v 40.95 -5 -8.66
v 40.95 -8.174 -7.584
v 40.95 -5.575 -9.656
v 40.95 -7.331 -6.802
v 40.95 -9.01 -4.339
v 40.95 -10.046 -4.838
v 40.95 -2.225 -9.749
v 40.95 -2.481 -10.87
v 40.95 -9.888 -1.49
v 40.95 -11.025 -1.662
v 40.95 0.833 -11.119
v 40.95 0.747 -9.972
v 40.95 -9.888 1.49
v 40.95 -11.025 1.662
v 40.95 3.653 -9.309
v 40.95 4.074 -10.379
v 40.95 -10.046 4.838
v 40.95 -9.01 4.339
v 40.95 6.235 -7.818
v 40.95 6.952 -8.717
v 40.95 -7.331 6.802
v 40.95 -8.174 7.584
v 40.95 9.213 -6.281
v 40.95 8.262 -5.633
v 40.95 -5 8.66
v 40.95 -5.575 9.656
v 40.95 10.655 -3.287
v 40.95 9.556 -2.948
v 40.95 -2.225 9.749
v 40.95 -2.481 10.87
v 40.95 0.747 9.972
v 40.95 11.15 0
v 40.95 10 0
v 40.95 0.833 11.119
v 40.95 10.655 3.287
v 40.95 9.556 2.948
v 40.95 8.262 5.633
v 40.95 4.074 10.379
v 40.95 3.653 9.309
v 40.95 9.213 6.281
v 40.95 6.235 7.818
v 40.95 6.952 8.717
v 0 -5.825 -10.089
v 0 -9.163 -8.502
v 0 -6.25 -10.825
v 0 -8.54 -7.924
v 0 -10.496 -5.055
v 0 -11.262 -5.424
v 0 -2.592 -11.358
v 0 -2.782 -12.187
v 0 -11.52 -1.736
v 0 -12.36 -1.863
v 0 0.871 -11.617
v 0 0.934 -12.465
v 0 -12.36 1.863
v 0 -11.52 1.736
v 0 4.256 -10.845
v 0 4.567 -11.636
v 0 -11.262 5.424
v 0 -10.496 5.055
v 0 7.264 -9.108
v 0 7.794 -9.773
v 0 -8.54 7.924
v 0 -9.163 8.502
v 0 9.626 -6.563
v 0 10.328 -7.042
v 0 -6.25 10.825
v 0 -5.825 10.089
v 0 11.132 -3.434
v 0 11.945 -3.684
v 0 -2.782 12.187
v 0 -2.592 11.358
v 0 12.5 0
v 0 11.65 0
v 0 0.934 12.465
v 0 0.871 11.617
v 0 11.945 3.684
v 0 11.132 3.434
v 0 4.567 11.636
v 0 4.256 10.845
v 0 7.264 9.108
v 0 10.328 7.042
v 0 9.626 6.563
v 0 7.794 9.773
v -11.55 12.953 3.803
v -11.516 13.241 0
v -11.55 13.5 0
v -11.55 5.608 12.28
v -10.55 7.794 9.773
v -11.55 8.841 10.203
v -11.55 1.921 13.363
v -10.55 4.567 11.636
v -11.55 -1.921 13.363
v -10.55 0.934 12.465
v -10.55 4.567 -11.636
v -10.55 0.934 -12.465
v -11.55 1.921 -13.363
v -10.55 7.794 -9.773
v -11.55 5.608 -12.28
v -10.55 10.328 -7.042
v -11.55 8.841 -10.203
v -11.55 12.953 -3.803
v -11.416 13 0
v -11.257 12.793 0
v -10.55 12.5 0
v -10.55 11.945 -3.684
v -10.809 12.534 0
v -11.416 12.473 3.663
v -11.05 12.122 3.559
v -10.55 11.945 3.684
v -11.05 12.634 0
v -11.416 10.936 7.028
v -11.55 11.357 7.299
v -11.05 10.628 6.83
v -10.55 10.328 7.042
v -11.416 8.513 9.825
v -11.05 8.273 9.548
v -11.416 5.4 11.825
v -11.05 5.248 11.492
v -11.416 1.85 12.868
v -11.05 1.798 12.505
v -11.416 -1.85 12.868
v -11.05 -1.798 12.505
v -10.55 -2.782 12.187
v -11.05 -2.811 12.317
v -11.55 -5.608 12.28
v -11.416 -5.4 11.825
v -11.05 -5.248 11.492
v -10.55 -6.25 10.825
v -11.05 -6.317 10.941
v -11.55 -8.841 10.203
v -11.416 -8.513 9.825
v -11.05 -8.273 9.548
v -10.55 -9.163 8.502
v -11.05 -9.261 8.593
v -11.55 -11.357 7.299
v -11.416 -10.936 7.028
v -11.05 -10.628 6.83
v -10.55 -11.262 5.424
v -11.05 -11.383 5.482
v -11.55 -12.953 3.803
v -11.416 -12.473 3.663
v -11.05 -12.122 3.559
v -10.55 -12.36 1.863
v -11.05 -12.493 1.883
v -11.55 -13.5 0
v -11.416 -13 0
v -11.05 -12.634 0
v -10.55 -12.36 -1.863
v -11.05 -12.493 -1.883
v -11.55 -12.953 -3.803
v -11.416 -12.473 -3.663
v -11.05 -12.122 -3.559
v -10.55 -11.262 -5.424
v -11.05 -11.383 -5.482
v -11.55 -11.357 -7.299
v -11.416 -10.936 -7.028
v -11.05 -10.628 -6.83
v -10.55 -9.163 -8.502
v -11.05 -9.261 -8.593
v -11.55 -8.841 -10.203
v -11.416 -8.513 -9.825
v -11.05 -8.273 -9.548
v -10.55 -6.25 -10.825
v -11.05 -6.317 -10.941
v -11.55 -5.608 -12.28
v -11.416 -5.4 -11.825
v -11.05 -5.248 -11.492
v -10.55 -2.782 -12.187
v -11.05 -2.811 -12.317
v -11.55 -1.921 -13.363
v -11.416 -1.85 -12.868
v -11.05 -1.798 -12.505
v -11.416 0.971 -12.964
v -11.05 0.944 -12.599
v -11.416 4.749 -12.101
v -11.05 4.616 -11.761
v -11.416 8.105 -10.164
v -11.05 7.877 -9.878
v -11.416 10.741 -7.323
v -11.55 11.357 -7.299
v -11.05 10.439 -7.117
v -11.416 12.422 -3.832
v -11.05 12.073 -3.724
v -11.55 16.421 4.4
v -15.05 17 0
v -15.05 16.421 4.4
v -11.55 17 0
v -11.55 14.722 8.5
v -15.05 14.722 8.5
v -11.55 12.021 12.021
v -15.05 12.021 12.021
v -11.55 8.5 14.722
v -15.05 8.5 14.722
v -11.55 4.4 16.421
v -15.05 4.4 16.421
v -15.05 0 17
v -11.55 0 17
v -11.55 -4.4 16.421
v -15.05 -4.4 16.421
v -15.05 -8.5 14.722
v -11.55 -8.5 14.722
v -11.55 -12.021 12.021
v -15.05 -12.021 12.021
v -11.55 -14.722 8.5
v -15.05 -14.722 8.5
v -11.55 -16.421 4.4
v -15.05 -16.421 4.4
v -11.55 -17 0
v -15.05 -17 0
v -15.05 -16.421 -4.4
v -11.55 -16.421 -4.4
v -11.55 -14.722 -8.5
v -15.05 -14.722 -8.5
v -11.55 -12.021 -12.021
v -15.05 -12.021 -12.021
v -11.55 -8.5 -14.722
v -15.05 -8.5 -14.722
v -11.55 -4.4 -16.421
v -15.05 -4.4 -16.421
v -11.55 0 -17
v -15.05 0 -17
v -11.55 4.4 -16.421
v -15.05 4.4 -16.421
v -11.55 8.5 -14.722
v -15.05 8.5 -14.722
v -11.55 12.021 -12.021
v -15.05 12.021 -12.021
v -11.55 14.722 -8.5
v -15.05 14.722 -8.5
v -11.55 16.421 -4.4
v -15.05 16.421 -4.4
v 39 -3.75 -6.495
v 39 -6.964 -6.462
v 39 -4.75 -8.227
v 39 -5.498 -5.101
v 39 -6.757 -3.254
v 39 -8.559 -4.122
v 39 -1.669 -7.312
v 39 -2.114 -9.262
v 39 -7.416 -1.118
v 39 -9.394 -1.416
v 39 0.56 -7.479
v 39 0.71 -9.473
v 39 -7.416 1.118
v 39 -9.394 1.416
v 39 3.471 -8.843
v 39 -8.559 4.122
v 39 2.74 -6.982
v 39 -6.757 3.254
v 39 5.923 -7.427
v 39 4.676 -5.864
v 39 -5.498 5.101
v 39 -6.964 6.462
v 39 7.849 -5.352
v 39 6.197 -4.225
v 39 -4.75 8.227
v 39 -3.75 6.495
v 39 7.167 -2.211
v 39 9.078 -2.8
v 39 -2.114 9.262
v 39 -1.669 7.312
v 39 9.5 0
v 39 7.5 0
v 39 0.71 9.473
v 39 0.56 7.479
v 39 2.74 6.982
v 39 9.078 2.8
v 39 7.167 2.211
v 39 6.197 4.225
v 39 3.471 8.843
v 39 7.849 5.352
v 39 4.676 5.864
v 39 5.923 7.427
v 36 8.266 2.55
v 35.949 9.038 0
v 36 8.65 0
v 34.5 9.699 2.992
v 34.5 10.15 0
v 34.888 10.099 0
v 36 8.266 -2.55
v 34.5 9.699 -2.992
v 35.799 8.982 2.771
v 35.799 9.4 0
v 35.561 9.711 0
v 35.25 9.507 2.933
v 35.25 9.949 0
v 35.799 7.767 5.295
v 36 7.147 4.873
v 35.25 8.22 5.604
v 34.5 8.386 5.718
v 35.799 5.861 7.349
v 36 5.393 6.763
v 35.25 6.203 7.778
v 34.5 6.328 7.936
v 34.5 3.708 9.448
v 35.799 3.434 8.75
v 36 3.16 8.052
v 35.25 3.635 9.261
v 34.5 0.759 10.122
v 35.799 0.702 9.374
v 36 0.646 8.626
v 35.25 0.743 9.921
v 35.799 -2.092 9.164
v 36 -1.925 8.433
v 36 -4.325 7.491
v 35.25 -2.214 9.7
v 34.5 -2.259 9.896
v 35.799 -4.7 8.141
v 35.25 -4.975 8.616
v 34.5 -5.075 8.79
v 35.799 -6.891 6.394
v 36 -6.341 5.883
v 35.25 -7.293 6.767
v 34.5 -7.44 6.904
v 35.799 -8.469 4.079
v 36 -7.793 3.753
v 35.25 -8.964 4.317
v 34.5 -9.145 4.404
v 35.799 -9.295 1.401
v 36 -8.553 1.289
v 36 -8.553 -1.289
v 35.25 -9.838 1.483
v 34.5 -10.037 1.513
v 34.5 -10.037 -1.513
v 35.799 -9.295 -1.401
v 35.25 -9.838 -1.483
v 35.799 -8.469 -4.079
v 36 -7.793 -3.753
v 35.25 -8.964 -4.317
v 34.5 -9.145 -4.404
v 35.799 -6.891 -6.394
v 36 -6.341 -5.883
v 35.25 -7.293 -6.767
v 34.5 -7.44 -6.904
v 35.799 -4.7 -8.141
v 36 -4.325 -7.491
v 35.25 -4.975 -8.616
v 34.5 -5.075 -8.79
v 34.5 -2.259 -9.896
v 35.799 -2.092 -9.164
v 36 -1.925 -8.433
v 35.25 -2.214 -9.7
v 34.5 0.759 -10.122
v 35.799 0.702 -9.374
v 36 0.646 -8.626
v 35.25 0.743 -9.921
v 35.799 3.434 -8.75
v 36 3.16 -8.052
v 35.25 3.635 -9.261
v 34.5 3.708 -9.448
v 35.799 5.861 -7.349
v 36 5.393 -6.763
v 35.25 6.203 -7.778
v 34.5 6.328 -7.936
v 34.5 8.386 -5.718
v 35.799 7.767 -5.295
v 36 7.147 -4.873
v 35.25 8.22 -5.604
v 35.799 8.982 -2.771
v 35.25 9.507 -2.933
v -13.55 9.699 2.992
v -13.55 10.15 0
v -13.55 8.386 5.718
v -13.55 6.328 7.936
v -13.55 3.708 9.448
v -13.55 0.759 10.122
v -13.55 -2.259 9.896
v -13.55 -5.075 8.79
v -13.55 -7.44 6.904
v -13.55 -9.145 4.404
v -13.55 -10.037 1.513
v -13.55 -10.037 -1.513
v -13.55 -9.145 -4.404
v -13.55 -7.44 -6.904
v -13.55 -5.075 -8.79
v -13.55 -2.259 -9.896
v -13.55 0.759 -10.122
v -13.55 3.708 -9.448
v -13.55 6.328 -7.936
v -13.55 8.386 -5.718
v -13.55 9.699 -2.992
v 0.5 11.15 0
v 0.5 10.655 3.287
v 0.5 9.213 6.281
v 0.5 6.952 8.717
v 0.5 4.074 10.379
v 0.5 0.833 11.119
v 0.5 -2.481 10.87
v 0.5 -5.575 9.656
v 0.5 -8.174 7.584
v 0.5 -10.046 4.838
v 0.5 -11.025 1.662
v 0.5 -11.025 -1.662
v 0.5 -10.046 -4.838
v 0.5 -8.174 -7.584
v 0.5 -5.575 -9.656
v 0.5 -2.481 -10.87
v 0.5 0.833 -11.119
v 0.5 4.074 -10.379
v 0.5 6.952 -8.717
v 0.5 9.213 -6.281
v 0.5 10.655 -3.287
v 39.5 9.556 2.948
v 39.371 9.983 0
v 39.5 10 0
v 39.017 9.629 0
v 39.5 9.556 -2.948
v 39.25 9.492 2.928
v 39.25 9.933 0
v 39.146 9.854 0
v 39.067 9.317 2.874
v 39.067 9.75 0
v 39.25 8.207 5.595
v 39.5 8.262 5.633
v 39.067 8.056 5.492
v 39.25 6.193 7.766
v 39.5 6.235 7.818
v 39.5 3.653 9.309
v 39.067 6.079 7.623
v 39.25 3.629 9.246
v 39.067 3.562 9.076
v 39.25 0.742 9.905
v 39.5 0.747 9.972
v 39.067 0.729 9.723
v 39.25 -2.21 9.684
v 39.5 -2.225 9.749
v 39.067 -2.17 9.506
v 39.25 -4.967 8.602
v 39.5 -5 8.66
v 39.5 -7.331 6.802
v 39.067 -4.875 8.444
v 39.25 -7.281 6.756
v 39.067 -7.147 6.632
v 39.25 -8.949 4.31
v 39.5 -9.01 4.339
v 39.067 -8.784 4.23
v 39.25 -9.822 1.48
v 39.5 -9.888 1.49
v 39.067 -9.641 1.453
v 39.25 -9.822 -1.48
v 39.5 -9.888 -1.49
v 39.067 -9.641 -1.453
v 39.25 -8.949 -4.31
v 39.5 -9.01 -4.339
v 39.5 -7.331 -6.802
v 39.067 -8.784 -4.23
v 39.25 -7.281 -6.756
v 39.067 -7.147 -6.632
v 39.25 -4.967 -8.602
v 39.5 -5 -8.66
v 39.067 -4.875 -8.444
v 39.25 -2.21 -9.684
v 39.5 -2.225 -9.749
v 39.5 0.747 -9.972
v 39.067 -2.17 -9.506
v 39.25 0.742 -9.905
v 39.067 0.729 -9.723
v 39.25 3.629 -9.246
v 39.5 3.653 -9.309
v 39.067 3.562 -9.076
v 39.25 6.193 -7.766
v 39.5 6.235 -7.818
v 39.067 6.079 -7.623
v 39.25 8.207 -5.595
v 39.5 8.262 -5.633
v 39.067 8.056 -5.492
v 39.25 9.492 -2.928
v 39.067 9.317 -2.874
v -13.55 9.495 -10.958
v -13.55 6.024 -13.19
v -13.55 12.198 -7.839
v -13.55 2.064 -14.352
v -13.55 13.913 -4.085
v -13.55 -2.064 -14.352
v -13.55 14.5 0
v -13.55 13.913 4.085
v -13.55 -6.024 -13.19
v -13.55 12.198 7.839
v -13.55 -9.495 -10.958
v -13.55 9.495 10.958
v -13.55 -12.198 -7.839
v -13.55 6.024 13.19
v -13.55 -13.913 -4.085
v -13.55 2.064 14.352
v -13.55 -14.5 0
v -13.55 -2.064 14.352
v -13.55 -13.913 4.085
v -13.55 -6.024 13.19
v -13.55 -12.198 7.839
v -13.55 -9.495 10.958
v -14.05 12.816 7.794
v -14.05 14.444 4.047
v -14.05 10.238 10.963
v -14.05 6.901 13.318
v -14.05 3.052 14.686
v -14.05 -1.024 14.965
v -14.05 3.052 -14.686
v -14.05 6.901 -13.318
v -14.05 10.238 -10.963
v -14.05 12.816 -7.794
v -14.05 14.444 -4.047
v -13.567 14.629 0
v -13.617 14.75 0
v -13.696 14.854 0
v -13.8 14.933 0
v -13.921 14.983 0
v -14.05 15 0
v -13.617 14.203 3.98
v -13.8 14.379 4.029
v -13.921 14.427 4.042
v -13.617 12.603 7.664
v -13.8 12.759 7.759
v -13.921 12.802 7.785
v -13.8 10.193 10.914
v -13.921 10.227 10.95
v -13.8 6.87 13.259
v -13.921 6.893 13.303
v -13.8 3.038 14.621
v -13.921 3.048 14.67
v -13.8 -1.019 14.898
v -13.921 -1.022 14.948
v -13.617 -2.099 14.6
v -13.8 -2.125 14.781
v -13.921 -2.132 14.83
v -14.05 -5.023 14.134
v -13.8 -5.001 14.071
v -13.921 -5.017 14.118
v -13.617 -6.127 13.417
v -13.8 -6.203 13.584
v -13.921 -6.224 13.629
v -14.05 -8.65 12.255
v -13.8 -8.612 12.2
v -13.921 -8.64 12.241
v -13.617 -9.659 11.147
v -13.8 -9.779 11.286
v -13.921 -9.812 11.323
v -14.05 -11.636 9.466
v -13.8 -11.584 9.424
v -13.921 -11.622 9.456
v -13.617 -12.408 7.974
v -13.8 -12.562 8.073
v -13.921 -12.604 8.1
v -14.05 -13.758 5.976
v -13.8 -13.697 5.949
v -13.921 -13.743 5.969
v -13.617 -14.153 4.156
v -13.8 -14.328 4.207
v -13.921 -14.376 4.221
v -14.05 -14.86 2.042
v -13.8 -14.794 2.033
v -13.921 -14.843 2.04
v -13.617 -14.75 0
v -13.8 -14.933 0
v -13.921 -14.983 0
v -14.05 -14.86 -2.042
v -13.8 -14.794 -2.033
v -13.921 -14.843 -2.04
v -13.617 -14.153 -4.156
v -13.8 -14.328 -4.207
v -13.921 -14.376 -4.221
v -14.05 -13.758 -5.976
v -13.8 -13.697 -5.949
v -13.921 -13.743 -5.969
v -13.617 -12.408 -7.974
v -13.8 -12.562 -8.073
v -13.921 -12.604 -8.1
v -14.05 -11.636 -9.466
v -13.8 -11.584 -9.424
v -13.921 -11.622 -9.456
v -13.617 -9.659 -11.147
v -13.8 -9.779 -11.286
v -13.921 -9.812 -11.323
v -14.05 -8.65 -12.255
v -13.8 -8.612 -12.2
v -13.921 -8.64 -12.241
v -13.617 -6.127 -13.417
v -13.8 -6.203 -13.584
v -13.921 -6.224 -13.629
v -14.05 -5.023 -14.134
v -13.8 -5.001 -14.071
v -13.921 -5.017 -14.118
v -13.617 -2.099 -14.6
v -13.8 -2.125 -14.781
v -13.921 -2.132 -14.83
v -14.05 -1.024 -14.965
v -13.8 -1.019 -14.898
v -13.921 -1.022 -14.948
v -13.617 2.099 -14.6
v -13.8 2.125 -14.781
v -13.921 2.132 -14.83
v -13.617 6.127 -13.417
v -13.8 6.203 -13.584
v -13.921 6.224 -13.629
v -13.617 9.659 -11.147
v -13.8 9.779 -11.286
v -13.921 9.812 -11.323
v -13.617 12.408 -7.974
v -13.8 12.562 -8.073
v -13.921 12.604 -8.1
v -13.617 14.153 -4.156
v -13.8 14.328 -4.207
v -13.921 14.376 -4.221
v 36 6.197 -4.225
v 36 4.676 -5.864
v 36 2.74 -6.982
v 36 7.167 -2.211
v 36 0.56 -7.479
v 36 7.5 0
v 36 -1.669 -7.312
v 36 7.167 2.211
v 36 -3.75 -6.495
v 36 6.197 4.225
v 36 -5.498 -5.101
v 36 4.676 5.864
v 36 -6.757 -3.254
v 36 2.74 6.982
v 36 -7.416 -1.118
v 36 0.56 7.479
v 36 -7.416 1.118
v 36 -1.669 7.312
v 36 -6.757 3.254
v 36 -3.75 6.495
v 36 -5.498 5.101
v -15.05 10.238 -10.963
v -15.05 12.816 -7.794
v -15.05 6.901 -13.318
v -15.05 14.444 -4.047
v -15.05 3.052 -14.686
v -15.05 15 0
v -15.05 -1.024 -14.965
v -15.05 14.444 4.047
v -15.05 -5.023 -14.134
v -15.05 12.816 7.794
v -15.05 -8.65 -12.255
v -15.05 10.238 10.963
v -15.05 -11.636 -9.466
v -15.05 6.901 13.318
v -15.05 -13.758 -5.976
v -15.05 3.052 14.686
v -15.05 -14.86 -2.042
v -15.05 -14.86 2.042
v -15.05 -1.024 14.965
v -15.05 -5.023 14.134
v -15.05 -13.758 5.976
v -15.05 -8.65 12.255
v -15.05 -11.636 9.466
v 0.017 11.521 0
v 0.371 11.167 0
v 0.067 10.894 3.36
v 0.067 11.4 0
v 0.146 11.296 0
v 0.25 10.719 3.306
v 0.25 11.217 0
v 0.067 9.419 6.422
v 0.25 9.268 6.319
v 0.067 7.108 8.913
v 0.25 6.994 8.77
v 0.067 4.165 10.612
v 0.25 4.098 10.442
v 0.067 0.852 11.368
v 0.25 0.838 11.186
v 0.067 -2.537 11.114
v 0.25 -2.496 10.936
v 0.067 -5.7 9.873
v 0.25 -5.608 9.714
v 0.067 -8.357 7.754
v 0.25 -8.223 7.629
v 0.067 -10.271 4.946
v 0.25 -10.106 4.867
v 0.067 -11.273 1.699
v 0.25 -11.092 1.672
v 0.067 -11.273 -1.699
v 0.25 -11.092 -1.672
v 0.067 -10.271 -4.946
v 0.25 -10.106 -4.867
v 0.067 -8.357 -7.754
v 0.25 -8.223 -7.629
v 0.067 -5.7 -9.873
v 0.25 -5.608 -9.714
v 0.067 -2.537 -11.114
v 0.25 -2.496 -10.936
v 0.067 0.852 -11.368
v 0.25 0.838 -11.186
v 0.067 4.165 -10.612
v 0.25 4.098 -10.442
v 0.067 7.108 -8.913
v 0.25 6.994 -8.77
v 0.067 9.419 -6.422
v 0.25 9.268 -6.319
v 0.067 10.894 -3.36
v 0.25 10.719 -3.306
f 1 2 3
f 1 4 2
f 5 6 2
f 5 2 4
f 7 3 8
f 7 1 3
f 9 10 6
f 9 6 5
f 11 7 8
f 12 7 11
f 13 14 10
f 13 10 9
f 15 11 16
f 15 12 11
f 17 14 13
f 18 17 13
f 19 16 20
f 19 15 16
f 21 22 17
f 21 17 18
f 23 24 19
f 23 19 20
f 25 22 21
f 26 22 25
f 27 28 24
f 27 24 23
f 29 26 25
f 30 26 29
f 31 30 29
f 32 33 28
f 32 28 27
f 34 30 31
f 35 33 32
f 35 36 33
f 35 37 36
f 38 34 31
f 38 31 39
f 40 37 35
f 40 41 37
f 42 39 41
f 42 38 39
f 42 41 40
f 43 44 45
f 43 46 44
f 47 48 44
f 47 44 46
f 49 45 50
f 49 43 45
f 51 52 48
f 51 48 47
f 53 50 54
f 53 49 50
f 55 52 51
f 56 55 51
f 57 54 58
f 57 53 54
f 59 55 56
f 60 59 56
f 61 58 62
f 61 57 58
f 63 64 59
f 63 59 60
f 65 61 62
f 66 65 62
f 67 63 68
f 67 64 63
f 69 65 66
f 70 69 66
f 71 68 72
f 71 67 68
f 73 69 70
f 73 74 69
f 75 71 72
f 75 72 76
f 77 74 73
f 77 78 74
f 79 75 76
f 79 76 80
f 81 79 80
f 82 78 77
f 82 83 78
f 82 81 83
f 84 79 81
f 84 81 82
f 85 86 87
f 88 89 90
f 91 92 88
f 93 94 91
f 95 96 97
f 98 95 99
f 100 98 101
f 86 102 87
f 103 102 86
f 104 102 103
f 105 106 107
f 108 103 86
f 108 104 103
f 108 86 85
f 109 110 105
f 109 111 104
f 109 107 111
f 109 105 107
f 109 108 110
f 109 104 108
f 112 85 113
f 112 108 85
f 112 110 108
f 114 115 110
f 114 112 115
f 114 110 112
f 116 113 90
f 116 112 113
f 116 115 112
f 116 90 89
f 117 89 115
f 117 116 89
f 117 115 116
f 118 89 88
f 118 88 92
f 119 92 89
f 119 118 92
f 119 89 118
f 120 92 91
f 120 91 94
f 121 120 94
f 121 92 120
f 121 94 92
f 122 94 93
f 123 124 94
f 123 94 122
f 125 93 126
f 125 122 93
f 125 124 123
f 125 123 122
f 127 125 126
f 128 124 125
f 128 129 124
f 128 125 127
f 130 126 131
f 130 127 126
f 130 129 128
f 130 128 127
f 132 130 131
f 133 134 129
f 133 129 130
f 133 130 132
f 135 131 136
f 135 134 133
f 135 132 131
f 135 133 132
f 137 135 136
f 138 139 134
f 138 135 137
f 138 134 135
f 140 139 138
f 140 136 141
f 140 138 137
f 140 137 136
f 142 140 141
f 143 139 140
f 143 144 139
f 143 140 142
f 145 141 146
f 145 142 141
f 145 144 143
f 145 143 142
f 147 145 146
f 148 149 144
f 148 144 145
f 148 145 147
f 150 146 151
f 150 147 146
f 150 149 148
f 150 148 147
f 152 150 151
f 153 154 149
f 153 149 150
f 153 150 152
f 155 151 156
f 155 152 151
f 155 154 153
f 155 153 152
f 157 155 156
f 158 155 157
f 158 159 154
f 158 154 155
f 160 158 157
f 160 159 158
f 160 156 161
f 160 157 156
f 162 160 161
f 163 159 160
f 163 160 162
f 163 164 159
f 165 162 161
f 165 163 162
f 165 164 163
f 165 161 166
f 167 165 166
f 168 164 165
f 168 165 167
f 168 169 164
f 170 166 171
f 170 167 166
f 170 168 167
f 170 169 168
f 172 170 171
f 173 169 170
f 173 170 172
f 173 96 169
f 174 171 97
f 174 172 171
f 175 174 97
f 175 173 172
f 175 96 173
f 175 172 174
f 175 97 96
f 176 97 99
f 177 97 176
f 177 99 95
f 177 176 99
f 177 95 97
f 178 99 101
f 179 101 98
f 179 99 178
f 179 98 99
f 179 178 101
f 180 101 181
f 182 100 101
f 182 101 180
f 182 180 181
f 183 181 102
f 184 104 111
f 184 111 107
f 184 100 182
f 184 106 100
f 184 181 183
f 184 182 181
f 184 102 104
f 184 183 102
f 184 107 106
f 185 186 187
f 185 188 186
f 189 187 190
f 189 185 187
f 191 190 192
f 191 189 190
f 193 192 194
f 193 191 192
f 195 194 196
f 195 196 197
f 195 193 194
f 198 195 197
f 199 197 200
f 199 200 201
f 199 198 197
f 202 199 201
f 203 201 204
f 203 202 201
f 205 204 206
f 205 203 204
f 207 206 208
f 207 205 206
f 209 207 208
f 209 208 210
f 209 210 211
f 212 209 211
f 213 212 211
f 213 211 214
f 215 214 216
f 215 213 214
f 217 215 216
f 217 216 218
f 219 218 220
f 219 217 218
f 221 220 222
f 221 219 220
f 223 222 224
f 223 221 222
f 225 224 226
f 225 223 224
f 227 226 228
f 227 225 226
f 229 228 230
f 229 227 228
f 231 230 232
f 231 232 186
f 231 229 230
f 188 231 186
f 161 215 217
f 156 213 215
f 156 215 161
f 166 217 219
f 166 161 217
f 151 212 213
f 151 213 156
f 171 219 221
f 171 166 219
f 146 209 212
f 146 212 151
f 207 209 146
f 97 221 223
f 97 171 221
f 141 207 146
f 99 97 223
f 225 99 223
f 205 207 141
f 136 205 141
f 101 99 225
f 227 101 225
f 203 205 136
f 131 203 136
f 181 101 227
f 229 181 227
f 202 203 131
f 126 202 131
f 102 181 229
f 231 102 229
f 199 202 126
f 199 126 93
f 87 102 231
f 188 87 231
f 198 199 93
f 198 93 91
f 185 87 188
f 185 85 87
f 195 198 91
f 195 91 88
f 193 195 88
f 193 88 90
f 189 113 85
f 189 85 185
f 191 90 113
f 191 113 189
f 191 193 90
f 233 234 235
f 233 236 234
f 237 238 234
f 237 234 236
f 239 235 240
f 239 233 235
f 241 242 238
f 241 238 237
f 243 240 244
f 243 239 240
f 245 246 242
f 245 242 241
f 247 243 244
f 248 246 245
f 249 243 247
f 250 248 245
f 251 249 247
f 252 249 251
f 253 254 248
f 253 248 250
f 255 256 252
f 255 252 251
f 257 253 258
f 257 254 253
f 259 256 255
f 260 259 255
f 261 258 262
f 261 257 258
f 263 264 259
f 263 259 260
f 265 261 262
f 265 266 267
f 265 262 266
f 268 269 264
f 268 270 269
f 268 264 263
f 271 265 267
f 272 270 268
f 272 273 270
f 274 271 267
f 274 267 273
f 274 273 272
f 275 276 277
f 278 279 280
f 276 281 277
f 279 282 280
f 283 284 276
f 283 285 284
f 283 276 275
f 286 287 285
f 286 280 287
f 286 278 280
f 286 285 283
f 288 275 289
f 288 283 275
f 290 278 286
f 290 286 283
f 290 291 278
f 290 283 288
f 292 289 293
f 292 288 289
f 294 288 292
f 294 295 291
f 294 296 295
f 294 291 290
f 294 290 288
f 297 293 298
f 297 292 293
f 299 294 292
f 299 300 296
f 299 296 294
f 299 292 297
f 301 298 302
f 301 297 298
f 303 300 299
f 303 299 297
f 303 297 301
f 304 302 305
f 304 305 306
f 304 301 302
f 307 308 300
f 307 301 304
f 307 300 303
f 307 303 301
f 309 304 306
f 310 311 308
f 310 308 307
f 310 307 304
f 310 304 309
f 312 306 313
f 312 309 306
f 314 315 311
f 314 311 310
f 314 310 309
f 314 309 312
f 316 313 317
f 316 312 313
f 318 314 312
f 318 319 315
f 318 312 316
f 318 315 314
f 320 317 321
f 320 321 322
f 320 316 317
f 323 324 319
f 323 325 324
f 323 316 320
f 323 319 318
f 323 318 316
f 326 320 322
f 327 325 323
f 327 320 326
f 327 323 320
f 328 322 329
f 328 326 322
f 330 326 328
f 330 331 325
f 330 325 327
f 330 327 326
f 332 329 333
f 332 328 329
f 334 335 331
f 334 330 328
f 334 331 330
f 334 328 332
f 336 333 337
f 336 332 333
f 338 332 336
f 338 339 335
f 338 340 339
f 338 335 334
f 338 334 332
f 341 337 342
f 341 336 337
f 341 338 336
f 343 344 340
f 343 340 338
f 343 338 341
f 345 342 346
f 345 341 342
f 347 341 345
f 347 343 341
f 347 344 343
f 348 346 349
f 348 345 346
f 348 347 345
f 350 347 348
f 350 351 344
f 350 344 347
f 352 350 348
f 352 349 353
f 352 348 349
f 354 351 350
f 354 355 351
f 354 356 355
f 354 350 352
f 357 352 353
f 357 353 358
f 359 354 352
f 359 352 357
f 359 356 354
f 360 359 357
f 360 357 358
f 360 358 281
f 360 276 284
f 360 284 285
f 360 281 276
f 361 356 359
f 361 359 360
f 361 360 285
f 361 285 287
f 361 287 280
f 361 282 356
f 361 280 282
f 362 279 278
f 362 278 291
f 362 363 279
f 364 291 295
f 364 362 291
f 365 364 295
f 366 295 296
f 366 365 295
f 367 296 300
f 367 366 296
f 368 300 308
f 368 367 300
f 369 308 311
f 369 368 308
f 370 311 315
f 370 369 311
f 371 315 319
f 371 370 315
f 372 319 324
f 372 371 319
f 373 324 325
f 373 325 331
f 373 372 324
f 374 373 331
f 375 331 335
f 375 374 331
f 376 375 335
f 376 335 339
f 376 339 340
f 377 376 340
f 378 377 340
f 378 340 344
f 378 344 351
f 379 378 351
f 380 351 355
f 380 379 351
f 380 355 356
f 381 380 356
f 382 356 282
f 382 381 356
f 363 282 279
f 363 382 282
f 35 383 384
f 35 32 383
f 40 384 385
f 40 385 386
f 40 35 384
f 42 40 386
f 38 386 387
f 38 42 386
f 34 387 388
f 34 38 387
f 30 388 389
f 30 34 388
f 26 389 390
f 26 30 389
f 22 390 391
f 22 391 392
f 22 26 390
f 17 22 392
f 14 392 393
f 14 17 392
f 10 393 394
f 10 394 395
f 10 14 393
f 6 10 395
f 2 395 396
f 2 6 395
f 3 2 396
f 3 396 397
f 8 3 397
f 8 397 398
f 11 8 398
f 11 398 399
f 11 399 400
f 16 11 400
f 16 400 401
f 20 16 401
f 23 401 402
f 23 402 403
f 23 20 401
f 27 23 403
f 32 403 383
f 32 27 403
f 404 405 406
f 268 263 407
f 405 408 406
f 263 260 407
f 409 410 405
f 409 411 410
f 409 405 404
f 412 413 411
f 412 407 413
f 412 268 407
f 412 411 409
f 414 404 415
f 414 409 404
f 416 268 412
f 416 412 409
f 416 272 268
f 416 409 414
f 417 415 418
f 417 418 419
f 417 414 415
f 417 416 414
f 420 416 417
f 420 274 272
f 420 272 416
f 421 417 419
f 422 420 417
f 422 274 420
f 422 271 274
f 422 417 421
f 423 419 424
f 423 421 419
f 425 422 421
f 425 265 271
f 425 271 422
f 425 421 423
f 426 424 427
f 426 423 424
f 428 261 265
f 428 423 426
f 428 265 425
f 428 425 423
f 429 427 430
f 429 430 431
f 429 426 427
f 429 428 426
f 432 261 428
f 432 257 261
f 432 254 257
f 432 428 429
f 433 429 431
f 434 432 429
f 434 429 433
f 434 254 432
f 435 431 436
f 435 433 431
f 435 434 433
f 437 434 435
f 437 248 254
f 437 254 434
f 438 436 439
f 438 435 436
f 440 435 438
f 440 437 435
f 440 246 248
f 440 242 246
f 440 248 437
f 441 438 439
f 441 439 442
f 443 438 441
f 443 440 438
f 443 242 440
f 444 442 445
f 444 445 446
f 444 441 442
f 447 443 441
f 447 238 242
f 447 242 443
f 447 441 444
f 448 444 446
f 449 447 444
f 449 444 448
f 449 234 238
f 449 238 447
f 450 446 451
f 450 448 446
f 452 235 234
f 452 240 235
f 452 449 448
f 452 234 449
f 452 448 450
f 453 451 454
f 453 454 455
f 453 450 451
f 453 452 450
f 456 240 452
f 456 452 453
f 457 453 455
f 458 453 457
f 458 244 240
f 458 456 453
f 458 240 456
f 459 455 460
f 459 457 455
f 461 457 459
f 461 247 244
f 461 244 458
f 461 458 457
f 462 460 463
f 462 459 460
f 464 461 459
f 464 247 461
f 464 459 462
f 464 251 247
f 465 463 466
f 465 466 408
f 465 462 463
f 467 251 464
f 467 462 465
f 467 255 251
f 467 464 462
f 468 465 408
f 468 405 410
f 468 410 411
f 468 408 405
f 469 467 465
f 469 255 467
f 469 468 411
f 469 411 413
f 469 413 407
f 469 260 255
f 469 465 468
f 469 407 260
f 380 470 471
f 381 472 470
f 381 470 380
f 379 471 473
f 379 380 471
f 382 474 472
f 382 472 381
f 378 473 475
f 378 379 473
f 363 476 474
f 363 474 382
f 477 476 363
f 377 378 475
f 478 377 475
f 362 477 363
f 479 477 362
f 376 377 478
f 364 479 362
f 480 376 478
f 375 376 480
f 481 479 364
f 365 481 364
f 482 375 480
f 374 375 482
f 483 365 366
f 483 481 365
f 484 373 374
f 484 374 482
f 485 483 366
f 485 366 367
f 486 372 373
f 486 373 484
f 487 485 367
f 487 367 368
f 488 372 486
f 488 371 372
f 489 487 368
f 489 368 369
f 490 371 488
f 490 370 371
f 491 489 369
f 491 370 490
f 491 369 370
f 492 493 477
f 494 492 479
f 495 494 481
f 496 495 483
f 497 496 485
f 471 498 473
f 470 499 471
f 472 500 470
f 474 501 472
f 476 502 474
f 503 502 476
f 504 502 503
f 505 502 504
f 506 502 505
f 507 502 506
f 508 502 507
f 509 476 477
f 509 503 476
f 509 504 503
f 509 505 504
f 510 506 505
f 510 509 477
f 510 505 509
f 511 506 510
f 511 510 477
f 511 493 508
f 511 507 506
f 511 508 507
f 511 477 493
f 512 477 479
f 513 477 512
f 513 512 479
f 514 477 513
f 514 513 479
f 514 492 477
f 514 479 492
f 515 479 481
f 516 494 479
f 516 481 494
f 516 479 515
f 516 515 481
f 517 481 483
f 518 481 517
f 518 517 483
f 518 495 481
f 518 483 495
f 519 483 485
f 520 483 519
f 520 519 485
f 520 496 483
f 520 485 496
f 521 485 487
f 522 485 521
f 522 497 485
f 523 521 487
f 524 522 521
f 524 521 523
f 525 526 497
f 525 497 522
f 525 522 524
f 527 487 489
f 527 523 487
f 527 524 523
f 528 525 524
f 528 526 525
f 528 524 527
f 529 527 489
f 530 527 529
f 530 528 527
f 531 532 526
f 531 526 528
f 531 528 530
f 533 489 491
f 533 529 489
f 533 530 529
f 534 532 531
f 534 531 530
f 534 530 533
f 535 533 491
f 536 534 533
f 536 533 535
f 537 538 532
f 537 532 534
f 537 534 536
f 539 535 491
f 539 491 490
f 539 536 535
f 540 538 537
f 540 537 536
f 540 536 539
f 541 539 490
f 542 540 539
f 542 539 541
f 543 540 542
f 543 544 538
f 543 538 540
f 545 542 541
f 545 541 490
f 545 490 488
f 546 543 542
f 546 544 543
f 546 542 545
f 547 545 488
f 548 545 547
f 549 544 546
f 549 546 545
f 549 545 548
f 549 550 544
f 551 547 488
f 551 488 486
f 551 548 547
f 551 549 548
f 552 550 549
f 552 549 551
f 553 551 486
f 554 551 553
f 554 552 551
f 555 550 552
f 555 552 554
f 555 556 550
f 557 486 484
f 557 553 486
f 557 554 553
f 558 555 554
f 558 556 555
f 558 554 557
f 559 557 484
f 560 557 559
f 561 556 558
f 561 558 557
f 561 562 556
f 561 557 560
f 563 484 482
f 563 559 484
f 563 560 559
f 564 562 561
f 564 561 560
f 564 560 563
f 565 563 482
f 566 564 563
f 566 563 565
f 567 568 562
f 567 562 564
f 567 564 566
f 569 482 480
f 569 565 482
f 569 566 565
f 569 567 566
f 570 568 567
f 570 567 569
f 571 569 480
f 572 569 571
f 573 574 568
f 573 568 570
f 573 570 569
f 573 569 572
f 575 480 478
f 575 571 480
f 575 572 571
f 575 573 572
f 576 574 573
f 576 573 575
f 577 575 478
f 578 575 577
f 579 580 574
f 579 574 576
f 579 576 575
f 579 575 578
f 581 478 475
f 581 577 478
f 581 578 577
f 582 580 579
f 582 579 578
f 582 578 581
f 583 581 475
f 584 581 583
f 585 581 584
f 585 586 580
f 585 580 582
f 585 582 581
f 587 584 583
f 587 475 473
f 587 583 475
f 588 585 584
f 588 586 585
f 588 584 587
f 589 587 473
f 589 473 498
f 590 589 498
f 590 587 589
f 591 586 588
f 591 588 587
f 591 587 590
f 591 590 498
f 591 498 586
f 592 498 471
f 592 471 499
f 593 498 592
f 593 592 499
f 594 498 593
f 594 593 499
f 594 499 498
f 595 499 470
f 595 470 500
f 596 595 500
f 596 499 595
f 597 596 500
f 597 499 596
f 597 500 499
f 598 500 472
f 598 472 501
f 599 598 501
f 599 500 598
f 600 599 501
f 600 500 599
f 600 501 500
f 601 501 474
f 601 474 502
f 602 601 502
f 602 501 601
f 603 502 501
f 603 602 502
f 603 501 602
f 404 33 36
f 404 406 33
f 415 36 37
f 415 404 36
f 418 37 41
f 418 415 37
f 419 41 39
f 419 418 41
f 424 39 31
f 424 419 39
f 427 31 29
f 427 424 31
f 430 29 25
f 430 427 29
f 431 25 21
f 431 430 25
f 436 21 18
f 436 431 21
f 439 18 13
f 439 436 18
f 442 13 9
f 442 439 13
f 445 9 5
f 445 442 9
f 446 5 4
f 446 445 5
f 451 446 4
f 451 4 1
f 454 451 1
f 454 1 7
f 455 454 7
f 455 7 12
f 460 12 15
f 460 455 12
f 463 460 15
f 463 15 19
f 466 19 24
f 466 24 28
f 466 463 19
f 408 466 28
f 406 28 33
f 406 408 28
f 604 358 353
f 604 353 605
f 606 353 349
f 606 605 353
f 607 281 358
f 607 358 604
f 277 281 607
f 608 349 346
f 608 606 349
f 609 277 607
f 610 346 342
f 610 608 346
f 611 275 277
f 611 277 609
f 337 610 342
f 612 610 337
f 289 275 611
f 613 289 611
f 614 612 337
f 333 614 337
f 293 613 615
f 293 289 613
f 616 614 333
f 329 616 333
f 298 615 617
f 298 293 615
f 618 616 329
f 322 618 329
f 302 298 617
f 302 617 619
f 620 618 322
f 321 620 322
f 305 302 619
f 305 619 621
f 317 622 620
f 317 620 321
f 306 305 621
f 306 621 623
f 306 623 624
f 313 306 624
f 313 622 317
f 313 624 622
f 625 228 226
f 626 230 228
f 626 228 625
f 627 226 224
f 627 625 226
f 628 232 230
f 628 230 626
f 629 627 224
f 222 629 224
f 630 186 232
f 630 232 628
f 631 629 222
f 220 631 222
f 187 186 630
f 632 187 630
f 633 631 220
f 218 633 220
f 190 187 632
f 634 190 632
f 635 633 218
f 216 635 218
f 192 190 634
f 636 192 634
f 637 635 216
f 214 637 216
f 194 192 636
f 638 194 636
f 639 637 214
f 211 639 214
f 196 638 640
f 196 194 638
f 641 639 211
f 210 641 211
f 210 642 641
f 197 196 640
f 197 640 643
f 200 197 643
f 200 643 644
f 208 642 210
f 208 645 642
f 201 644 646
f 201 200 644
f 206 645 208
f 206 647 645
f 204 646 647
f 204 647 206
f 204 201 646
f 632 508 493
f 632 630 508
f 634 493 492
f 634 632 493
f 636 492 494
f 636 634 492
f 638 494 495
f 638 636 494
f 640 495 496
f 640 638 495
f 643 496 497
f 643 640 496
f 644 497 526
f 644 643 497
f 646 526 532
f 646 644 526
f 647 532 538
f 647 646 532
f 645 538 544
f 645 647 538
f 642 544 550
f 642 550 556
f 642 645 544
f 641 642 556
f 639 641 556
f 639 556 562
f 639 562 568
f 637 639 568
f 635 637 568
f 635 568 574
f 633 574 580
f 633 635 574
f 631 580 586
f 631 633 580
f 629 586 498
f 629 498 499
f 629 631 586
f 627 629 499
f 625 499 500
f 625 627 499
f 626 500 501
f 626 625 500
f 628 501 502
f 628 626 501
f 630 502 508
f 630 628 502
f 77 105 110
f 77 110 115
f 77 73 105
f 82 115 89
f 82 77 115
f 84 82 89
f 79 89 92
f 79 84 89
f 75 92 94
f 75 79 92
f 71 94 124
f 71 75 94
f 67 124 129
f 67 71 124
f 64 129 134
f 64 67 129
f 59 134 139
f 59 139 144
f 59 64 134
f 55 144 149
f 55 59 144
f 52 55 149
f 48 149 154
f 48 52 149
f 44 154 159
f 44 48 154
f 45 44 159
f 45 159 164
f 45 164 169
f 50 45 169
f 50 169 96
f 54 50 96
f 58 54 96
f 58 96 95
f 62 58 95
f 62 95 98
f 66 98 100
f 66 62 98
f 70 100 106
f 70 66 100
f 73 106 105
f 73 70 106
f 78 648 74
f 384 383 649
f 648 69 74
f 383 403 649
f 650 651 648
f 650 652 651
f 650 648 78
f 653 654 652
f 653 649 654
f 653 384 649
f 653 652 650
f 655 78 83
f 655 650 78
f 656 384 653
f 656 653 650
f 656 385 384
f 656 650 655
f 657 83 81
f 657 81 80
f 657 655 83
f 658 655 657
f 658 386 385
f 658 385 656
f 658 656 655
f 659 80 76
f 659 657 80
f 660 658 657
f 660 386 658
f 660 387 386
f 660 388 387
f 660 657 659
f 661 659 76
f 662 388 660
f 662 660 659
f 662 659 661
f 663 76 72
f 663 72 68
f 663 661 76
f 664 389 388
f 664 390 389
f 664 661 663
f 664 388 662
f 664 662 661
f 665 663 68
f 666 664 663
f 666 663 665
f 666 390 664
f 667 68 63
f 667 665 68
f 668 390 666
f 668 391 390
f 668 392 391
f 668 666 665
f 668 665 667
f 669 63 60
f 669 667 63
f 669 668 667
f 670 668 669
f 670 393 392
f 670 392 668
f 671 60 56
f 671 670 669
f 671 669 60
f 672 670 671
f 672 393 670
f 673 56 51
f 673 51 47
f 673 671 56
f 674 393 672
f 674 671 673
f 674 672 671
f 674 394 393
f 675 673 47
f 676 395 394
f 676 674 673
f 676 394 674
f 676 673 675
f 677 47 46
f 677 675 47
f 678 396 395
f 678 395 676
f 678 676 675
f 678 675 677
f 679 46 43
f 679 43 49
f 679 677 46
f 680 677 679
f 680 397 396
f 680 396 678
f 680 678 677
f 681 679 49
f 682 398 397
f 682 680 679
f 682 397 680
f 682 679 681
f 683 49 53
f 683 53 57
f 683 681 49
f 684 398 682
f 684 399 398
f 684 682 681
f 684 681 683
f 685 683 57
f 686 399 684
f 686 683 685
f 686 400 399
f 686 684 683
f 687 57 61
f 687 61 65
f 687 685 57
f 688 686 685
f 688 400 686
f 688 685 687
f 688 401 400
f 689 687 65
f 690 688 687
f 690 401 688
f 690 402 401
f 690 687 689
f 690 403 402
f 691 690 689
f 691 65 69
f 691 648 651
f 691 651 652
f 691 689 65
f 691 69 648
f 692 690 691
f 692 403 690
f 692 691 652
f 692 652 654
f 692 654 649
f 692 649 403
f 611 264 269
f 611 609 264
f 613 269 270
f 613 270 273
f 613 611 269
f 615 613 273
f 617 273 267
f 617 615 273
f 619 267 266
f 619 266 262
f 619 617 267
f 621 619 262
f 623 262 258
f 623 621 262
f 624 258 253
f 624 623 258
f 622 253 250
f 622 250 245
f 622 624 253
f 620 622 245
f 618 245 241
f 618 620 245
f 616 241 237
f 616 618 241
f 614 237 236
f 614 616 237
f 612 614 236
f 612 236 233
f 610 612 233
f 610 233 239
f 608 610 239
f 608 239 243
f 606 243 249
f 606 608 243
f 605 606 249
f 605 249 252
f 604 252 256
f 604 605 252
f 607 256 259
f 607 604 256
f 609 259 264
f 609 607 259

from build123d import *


with BuildPart() as part:
    # Sketch1 → Revolve1 (revolve)
    with BuildSketch(Plane.XY):
        with BuildLine():
            Line((0, 12.5), (0, 11.65))
            ThreePointArc((0, 11.65), (0.146446609, 11.296446609), (0.5, 11.15))
            Line((0.5, 11.15), (40.95, 11.15))
            Line((40.95, 11.15), (40.95, 10))
            Line((40.95, 10), (39.5, 10))
            ThreePointArc((39.5, 10), (39.146446609, 9.853553391), (39, 9.5))
            Line((39, 9.5), (39, 7.5))
            Line((39, 7.5), (36, 7.5))
            Line((36, 7.5), (36, 8.65))
            ThreePointArc((36, 8.65), (35.560660172, 9.710660172), (34.5, 10.15))
            Line((34.5, 10.15), (-13.55, 10.15))
            Line((-13.55, 10.15), (-13.55, 14.5))
            ThreePointArc((-13.55, 14.5), (-13.696446609, 14.853553391), (-14.05, 15))
            Line((-14.05, 15), (-15.05, 15))
            Line((-15.05, 15), (-15.05, 17))
            Line((-15.05, 17), (-11.55, 17))
            Line((-11.55, 17), (-11.55, 13.5))
            ThreePointArc((-11.55, 13.5), (-11.257106781, 12.792893219), (-10.55, 12.5))
            Line((-10.55, 12.5), (0, 12.5))
        make_face()
    revolve(axis=Axis((-88.99, 0, 0), (1, 0, 0)))


solid = part.part
